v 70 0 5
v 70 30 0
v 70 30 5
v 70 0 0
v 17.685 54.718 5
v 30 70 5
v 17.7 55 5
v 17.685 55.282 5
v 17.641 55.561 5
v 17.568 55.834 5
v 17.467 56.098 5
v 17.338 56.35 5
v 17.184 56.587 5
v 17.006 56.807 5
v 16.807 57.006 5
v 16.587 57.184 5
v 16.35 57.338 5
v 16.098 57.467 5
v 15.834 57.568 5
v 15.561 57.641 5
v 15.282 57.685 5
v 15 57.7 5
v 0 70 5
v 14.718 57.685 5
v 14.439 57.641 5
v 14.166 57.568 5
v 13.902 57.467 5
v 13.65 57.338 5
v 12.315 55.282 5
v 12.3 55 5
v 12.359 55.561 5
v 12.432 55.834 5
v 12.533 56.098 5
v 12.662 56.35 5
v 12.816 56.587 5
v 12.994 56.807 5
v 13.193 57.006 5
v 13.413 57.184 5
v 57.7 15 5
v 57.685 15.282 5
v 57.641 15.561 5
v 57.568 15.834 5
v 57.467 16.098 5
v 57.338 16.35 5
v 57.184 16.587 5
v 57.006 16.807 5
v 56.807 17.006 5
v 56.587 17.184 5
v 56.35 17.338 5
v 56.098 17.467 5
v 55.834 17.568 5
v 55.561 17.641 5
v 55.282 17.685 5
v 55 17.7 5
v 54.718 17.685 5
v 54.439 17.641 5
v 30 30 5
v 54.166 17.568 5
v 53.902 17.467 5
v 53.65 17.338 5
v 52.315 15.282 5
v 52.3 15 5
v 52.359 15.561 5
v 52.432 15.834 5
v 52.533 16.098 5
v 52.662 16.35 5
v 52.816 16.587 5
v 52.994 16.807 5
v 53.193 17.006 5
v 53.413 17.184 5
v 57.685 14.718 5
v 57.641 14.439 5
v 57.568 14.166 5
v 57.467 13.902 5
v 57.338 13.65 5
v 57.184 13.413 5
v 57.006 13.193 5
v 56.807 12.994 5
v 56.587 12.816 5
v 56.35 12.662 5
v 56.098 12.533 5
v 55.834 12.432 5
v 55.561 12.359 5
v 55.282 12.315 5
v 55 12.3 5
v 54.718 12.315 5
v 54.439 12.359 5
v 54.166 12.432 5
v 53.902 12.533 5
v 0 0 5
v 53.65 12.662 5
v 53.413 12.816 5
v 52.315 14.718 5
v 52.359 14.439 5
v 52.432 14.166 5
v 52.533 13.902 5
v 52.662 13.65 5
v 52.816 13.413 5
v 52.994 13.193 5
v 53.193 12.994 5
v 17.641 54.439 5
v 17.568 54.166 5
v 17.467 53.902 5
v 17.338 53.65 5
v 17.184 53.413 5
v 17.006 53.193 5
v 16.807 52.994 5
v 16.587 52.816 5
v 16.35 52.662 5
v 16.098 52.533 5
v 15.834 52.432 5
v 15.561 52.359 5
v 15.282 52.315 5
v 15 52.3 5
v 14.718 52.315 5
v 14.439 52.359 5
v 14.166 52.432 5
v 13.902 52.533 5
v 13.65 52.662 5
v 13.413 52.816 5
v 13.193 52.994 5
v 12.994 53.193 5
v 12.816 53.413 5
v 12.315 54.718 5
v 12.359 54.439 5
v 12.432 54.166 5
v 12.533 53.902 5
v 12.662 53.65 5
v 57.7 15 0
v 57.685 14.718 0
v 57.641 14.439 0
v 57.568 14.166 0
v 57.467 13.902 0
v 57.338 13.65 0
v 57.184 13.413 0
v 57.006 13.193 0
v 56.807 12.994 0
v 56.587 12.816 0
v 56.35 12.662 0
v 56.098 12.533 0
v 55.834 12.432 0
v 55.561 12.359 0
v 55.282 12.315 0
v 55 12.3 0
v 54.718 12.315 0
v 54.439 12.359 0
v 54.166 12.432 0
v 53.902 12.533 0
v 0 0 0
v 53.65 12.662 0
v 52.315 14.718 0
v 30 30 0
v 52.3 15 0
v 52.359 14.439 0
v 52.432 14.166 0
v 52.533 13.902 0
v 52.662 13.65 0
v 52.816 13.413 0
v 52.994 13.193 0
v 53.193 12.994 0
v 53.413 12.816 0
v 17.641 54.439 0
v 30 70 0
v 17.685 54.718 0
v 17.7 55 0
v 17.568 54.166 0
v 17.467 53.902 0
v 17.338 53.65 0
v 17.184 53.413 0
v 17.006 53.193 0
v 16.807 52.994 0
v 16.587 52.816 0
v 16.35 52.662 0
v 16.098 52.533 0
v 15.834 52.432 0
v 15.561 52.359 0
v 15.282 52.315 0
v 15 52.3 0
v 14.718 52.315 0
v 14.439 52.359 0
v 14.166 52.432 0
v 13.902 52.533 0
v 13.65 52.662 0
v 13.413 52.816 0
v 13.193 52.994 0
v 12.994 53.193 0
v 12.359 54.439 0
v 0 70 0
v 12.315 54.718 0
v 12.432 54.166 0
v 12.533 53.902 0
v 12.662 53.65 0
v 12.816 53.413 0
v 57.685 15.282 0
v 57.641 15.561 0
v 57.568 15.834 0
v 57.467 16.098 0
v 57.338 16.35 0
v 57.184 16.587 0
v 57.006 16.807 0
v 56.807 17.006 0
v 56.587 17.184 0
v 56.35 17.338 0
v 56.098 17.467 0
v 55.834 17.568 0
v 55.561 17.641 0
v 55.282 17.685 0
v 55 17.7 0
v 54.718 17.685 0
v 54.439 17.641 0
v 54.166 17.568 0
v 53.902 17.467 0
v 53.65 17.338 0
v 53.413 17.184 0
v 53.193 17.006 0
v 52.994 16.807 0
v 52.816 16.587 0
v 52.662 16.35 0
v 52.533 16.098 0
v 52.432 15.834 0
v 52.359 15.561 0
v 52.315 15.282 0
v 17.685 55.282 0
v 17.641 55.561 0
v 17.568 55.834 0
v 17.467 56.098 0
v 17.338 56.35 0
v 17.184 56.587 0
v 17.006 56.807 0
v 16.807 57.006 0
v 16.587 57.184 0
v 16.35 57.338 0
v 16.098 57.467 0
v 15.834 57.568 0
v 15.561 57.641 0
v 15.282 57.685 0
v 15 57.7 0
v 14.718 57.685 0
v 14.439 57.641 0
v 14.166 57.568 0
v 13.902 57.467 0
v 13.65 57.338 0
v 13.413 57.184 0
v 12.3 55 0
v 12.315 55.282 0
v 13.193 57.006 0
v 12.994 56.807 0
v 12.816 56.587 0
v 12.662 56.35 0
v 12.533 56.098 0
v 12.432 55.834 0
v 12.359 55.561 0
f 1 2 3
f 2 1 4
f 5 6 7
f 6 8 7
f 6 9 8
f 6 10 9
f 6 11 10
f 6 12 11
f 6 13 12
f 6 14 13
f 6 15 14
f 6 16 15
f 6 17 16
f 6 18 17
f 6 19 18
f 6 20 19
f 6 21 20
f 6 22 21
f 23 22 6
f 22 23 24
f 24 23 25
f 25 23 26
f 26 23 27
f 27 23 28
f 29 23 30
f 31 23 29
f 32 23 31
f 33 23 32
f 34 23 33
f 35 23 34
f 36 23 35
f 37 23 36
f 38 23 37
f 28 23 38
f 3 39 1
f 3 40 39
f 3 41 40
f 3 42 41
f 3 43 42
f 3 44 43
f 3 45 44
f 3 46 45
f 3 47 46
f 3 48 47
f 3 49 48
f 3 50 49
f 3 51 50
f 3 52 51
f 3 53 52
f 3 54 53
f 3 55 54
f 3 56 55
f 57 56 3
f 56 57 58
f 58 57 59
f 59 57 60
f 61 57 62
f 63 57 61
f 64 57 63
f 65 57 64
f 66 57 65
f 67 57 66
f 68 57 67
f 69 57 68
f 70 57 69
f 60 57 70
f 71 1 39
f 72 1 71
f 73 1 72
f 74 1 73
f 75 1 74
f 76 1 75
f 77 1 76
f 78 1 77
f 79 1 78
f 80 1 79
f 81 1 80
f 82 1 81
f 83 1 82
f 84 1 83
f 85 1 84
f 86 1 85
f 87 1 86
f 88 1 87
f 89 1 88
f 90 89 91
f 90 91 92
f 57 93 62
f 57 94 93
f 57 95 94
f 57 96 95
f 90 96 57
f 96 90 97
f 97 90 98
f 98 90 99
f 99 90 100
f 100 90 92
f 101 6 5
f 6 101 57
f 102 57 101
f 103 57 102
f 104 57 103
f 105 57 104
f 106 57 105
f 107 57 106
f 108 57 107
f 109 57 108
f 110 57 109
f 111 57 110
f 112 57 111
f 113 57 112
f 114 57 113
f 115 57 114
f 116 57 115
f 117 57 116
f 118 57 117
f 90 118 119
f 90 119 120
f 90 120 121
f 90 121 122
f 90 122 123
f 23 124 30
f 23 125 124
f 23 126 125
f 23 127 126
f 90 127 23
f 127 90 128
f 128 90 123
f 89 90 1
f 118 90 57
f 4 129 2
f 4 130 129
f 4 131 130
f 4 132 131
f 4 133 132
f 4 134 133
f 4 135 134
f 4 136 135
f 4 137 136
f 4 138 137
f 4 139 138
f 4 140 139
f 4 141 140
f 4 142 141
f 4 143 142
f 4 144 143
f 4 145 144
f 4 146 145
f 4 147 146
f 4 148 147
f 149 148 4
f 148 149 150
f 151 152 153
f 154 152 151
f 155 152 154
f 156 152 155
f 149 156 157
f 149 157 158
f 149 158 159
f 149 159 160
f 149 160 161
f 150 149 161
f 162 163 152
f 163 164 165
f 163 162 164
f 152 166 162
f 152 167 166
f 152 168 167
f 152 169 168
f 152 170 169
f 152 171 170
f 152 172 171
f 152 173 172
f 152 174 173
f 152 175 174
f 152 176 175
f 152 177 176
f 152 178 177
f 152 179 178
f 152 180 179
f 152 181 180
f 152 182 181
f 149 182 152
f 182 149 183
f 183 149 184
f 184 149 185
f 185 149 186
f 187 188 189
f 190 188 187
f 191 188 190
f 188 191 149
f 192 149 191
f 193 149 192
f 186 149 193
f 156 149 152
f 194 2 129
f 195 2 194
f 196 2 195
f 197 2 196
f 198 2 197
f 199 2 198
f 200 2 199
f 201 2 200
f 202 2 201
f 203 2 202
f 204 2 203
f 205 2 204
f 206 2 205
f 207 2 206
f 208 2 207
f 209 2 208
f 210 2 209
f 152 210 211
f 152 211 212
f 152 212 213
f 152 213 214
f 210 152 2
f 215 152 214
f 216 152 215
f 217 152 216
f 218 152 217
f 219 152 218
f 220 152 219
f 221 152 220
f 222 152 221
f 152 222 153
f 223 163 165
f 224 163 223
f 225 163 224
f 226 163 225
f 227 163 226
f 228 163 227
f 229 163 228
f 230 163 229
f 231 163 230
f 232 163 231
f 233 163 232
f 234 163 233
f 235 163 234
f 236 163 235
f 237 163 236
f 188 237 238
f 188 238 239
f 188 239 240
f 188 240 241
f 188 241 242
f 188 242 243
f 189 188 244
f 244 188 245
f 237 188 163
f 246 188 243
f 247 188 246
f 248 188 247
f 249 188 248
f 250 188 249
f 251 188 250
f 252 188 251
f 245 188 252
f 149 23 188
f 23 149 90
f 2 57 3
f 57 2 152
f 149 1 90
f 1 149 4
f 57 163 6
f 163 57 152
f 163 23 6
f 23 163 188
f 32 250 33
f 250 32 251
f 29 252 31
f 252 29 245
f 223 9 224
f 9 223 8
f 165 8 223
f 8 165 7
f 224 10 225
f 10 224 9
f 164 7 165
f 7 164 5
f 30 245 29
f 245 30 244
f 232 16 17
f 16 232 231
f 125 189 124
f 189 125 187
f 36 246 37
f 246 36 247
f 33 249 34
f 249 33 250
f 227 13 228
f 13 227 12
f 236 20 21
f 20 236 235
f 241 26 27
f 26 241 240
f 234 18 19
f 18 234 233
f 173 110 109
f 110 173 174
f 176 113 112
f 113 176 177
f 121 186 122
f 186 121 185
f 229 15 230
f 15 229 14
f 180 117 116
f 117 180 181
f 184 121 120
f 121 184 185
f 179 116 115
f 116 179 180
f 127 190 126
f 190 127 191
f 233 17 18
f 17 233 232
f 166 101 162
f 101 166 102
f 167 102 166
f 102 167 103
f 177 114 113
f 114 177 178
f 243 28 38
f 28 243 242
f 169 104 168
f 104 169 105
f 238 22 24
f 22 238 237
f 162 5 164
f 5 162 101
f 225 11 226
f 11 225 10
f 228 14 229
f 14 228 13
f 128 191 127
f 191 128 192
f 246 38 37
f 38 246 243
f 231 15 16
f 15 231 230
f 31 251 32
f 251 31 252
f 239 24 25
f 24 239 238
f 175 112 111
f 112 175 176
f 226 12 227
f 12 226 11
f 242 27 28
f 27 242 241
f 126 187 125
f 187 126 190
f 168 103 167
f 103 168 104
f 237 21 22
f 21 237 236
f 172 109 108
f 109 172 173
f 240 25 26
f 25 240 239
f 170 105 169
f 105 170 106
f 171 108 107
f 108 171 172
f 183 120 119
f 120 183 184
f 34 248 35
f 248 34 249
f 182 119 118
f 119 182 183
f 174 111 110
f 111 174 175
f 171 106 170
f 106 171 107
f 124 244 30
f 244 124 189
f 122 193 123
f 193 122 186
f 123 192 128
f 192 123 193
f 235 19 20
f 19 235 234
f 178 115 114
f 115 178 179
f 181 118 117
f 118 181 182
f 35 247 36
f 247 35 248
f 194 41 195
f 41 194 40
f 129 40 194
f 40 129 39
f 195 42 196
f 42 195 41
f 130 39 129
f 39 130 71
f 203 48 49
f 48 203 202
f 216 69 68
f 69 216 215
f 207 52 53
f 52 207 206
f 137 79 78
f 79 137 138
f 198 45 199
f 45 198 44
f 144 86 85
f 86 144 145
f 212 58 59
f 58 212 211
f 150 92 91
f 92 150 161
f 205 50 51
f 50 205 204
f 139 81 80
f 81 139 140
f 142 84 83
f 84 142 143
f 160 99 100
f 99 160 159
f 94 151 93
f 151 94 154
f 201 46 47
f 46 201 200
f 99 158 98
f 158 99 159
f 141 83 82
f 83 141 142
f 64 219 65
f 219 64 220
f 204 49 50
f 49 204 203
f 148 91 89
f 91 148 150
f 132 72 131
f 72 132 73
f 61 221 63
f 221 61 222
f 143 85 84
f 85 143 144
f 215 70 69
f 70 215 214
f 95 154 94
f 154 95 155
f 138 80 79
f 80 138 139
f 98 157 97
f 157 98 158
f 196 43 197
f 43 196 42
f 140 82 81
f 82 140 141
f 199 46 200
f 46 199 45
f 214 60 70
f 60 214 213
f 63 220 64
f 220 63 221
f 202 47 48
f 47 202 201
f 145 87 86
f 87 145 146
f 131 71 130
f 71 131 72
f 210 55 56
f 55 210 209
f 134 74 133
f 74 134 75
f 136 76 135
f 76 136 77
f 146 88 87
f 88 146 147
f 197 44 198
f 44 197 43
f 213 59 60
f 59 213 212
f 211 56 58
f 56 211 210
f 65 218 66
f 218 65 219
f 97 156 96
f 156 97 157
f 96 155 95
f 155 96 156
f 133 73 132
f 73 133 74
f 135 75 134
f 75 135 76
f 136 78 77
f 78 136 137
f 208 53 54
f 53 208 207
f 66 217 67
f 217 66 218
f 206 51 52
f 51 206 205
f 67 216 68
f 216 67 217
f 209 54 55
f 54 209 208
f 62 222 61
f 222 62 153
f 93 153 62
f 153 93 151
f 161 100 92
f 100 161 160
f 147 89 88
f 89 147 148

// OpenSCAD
// Flat 90-degree corner plate.
$fn = 60;
eps = 0.02;
arm = 70;
width = 30;
plate_t = 5;
difference() {
    union() { cube([arm, width, plate_t]); cube([width, arm, plate_t]); }
    for (p = [[width / 2, arm - width / 2], [arm - width / 2, width / 2]])
        translate([p[0], p[1], -eps]) cylinder(d = 5.4, h = plate_t + 2 * eps);
}
